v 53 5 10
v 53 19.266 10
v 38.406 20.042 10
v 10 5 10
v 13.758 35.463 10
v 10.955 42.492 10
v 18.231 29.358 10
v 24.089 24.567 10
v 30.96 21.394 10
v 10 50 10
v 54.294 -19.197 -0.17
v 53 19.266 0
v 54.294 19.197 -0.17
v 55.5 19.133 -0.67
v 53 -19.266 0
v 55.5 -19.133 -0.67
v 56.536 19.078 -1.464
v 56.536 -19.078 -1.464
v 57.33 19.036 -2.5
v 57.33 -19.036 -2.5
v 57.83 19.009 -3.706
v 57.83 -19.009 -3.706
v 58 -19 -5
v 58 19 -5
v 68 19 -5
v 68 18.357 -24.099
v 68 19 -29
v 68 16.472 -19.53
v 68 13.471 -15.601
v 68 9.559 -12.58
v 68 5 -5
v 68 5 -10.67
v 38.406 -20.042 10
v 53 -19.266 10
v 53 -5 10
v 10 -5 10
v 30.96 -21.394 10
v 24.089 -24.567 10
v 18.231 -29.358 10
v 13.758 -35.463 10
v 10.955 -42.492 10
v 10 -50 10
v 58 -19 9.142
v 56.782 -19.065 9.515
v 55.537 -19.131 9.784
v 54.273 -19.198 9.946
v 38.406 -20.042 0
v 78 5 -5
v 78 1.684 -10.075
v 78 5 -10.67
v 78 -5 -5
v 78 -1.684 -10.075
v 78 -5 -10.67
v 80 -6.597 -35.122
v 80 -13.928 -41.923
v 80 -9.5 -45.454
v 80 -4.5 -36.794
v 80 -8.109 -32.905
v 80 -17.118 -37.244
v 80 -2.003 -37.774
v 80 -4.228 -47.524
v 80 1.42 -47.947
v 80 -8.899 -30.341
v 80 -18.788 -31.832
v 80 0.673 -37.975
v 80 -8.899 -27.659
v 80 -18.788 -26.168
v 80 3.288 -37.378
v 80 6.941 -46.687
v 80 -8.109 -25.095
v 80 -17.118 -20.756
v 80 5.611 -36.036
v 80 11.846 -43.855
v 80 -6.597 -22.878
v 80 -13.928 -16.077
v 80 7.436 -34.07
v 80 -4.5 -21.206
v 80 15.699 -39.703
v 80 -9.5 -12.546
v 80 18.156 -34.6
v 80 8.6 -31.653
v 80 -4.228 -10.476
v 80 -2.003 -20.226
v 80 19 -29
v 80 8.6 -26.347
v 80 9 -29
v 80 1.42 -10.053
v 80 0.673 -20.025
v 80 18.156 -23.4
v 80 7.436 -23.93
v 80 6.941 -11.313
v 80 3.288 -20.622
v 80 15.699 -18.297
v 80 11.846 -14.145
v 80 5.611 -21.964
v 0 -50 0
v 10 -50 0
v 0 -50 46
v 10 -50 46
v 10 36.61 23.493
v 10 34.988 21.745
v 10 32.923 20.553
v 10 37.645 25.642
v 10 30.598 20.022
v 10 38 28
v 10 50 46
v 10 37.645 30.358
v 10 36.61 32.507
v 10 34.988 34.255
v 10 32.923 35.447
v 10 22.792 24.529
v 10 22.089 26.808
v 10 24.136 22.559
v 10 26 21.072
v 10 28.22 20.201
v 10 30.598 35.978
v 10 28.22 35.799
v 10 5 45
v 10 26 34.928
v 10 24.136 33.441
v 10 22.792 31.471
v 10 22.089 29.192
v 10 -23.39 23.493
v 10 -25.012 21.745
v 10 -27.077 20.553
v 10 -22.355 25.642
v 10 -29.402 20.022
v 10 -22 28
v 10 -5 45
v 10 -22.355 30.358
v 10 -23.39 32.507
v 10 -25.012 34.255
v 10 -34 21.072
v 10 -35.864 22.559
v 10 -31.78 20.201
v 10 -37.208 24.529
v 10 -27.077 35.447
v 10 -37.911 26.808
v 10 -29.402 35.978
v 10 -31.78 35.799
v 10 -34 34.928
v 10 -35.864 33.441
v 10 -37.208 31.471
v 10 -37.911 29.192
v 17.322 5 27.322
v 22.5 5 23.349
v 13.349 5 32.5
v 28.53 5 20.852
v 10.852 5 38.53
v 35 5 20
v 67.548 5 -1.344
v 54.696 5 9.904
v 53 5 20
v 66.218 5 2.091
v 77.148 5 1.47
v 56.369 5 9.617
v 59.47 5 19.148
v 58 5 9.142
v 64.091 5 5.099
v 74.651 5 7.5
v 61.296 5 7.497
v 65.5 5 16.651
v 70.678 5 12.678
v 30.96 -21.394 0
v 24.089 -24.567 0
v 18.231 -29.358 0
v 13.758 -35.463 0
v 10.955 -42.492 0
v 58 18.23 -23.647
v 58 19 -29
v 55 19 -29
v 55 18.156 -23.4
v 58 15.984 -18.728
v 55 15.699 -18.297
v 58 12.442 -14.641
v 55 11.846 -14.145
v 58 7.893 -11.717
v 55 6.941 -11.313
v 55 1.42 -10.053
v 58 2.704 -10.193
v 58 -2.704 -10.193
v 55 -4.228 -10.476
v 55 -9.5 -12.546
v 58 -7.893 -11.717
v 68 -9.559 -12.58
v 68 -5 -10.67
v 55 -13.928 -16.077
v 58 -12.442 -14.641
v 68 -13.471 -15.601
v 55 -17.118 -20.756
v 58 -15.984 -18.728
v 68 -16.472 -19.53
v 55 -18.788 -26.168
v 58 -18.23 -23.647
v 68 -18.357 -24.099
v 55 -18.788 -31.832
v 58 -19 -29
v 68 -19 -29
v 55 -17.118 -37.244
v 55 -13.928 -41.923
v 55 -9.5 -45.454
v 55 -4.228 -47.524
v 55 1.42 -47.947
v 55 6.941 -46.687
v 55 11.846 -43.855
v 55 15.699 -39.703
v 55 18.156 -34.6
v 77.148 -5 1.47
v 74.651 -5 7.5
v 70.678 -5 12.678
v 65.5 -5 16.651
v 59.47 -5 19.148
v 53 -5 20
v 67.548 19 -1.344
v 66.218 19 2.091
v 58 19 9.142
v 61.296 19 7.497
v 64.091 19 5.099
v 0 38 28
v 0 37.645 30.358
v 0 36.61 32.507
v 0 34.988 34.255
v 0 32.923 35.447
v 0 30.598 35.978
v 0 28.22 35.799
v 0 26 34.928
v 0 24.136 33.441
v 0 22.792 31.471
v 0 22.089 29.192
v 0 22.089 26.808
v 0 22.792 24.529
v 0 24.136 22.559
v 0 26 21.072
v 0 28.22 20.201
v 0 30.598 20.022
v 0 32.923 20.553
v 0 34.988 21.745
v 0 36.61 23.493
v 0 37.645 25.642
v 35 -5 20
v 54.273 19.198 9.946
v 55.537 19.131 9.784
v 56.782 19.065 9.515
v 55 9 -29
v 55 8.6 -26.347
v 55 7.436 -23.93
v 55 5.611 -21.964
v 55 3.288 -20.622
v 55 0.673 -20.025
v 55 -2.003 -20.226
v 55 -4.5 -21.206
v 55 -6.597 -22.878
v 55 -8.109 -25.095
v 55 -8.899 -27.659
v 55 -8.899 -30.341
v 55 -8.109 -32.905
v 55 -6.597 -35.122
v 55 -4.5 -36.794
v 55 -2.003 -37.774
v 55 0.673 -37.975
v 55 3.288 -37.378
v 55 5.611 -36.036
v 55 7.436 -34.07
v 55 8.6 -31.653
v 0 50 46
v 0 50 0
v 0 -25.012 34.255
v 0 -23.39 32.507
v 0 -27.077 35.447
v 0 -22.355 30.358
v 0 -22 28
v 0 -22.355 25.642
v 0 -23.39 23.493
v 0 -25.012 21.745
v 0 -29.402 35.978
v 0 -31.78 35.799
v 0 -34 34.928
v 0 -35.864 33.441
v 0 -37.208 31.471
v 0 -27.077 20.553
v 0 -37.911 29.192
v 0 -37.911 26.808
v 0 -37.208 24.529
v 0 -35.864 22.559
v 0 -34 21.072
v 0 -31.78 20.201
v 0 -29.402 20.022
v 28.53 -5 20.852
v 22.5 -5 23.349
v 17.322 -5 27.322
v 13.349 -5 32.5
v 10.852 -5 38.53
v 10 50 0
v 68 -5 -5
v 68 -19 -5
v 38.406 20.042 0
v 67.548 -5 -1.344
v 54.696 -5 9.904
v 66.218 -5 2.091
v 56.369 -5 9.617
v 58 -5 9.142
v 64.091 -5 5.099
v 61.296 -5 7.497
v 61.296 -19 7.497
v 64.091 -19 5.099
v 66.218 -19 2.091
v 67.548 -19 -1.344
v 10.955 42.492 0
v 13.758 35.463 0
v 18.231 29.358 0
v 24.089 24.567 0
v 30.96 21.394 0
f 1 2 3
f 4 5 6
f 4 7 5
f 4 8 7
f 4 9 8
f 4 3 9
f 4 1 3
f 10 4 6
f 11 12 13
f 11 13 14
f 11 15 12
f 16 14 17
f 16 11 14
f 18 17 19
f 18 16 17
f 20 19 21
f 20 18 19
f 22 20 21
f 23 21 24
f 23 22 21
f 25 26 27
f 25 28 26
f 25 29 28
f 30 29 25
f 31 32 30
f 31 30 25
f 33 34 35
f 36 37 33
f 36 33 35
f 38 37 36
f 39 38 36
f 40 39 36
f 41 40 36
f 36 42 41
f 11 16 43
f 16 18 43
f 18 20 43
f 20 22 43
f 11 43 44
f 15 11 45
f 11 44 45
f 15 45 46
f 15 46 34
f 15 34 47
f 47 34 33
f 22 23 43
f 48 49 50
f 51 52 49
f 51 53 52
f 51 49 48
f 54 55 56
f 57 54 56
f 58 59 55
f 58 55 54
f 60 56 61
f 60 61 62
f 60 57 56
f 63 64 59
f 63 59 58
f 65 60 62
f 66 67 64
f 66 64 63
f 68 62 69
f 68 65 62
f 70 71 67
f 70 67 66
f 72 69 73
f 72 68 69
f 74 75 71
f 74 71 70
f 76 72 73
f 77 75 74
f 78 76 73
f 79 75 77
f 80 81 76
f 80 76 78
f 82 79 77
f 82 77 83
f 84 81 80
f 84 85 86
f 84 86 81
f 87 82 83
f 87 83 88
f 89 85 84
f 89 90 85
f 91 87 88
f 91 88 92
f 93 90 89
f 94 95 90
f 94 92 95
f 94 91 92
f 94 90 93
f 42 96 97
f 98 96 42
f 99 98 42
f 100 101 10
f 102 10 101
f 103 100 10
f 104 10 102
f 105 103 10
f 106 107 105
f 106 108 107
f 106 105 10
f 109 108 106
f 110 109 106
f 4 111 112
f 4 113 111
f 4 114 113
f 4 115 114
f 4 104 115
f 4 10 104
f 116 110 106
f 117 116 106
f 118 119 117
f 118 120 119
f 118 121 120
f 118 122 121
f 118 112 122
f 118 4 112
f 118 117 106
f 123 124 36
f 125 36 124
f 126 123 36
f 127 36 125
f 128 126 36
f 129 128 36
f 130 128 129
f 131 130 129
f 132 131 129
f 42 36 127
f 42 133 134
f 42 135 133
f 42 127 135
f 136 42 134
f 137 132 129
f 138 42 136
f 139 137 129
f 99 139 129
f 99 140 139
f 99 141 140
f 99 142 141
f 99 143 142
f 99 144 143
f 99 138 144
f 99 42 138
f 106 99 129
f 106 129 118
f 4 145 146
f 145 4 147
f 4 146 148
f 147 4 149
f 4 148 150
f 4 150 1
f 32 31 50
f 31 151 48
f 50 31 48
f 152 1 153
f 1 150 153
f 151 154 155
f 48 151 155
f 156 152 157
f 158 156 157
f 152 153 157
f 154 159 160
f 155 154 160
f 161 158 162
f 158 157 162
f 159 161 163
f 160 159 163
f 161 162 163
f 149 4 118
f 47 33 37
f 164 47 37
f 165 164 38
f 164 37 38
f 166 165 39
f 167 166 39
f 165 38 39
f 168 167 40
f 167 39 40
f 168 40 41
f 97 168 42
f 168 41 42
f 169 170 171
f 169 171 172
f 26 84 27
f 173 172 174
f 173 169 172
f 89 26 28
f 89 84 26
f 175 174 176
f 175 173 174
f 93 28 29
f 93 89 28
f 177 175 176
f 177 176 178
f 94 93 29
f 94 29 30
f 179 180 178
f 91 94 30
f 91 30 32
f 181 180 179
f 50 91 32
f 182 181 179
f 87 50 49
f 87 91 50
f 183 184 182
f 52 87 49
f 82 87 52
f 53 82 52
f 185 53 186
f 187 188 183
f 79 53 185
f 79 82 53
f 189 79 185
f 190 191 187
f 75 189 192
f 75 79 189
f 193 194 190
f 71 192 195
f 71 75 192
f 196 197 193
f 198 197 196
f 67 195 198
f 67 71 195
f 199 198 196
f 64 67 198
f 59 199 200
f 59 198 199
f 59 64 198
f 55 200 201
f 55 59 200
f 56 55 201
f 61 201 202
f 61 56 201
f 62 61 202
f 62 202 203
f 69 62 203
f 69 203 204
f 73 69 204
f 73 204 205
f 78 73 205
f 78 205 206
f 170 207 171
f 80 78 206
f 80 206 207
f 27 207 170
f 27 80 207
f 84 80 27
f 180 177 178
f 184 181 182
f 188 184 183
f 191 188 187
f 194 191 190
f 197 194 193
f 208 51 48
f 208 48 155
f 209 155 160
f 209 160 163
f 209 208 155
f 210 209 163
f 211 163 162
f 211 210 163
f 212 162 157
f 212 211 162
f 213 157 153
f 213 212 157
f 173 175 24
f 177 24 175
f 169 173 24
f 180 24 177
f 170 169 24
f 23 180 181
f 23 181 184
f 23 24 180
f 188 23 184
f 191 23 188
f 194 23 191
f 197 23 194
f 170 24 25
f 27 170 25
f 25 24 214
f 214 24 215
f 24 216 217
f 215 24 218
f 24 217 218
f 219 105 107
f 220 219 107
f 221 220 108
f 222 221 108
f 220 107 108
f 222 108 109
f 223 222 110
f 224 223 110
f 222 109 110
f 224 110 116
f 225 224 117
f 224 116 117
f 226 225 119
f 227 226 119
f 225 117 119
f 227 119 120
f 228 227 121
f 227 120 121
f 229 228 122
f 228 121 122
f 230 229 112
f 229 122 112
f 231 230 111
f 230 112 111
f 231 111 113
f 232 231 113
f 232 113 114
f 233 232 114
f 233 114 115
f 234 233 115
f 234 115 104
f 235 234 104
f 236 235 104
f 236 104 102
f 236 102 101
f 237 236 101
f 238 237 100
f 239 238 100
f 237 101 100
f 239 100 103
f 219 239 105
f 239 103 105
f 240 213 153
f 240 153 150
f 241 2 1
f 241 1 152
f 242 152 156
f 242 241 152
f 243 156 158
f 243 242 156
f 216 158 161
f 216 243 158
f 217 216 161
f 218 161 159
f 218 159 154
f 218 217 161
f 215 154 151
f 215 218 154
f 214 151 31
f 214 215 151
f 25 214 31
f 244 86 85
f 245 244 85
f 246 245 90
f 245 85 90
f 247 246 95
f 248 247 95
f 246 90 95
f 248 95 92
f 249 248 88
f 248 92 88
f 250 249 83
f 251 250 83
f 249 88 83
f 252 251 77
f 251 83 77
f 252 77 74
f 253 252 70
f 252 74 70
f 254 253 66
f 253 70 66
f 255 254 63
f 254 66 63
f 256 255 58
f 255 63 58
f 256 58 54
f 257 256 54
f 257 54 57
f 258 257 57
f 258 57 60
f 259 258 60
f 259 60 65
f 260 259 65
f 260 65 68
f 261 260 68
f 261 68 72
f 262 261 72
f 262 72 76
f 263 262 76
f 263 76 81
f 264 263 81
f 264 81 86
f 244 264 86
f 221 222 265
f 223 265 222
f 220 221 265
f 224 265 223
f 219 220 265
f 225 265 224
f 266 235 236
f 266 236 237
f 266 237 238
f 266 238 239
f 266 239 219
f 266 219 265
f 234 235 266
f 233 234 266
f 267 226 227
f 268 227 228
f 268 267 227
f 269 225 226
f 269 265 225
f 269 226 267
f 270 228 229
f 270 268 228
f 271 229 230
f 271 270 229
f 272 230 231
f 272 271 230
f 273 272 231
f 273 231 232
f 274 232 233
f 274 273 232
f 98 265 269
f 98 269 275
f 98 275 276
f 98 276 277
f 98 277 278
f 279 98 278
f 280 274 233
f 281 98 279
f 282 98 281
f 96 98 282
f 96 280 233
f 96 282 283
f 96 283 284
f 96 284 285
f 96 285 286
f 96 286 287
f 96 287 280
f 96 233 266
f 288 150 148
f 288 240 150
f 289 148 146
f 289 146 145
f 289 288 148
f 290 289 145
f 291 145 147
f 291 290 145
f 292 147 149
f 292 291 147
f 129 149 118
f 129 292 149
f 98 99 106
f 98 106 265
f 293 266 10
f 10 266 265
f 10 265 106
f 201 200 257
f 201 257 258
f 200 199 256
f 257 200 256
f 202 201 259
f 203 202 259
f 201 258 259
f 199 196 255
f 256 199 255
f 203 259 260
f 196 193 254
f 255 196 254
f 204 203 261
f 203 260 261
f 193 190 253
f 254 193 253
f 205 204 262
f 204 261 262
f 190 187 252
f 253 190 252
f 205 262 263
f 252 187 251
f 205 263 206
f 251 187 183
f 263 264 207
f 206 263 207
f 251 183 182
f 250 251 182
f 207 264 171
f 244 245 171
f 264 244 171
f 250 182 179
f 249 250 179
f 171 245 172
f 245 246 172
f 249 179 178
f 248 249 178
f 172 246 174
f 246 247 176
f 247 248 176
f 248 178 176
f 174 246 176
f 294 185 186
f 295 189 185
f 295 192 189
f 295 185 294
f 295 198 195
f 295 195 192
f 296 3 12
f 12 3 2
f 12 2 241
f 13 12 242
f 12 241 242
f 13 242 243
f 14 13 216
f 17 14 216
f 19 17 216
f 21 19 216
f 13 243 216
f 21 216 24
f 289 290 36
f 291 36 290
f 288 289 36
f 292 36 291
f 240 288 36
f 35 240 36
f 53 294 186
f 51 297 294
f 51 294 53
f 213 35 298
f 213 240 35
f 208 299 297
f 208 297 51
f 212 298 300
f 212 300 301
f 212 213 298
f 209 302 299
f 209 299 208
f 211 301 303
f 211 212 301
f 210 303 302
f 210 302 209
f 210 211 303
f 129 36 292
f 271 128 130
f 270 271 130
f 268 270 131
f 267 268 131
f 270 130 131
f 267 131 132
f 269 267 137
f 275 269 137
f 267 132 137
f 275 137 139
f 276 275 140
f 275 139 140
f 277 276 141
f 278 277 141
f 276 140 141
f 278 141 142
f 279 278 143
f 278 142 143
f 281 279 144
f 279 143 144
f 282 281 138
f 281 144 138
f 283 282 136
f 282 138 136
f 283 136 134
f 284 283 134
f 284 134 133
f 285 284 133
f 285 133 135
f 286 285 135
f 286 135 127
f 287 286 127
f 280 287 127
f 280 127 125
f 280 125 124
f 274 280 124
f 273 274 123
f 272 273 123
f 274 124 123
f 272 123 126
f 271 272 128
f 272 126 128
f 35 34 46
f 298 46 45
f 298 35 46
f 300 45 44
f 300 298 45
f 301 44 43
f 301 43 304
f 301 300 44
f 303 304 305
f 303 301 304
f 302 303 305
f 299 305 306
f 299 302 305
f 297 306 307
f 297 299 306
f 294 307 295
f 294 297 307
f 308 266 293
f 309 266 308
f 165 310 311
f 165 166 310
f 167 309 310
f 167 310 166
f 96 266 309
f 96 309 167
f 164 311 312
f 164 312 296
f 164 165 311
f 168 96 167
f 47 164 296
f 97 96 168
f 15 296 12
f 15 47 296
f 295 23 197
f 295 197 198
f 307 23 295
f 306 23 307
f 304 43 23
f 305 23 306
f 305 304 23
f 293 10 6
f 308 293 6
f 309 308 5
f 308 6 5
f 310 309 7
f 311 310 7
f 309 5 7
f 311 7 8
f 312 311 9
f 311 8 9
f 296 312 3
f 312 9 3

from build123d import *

# Parameters (mm, degrees)
F1_DEPTH    = 50
F2_DEPTH    = 19
F4_DEPTH    = 10
F5_R        = 5
F6_T1_DEPTH = 113
F7_R        = 8
F8_DEPTH    = 10
F11_W       = 28.4062897359
F11_H       = 10.0000000002
F12_DEPTH   = 5
F10_R       = 9
F13_DEPTH   = 25
F14_DEPTH   = 20


# Not quite as in the source:
# - a fillet or chamfer that OpenCascade refuses, or shapes differently, is made with other operations: its cross-section is extruded or revolved along the edge and cut away or added


with BuildPart() as f1:
    # F0 (on Front) → F1 (new body, symmetric)
    with BuildSketch(Plane.XZ):
        Polygon((0, 46), (0, 0), (58, 0), (58, 10), (10, 10), (10, 46), align=None)
    extrude(amount=F1_DEPTH, both=True)

    # F0 (on Front) → F2 (join, symmetric)
    with BuildSketch(Plane.XZ):
        Polygon((0, 46), (0, 0), (58, 0), (58, 10), (10, 10), (10, 46), align=None)
        Polygon((58, 10), (58, 0), (58, -29), (68, -29), (68, 10), align=None)
    extrude(amount=F2_DEPTH, both=True)

    # F3 (on face) → F4 (cut, through all)
    with BuildSketch(Plane.XY.offset(10)):
        with BuildLine():
            Line((58, -19), (38.4062897359, -20.0423617821))
            ThreePointArc((38.4062897359, -20.0423617821), (18.2306257793, -29.3579471457), (10, -50))
            Line((10, -50), (58, -50))
            Line((58, -50), (58, -19))
        make_face()
        with BuildLine():
            Line((58, 50), (10, 50))
            ThreePointArc((10, 50), (18.2306257793, 29.3579471457), (38.4062897359, 20.0423617821))
            Line((38.4062897359, 20.0423617821), (58, 19))
            Line((58, 19), (58, 50))
        make_face()
    extrude(amount=-F4_DEPTH, mode=Mode.SUBTRACT)

    # F5
    f5_edges = [f1.edges().sort_by_distance(p)[0] for p in [
        (58, 0, 0),
    ]]
    fillet(f5_edges, radius=F5_R)

    # F6: fillet of radius 15 on 1 edges, made by hand

    # F6_s2 → F6_t1 (cut)
    with BuildSketch(Plane.XZ.offset(-56.5)):
        with BuildLine():
            ThreePointArc((53, 10), (63.6066017178, 5.6066017178), (68, -5))
            Line((68, -5), (68, 10))
            Line((68, 10), (53, 10))
        make_face()
    extrude(amount=F6_T1_DEPTH, mode=Mode.SUBTRACT)

    # F7 (on face) → F8 (cut, through all)
    with BuildSketch(Plane.YZ.offset(10)):
        with Locations((-30, 28)):
            Circle(F7_R)
        with Locations((30, 28)):
            Circle(F7_R)
    extrude(amount=-F8_DEPTH, mode=Mode.SUBTRACT)

    # F11 (on Front) → F12 (join, symmetric)
    with BuildSketch(Plane.XZ):
        Polygon((10, 10), (10, 45.0000000683), (10, 46), (0, 46), (0, 0), (10, 0), align=None)
        with BuildLine():
            ThreePointArc((35, 20), (17.3223304462, 27.3223304945), (10, 45.0000000683))
            Line((10, 45.0000000683), (10, 10))
            Line((10, 10), (38.4062897359, 10))
            Line((38.4062897359, 10), (53, 10))
            ThreePointArc((53, 10), (55.5365296809, 9.7839783948), (58, 9.1421356237))
            ThreePointArc((58, 9.1421356237), (65.2474487139, 3.6602540378), (68, -5))
            Line((68, -5), (68, -29))
            Line((68, -29), (78, -29))
            Line((78, -29), (78, -5))
            ThreePointArc((78, -5), (70.6776695297, 12.6776695297), (53, 20))
            Line((53, 20), (35, 20))
        make_face()
        with Locations((24.2031448679, 4.9999999999)):
            Rectangle(F11_W, F11_H)
    extrude(amount=F12_DEPTH, both=True)

    # F10 (on offset) → F13 (join)
    with BuildSketch(Plane.YZ.offset(80)):
        with BuildLine():
            ThreePointArc((-19, -29), (0, -48), (19, -29))
            ThreePointArc((19, -29), (0, -10), (-19, -29))
        make_face()
        with Locations((0, -29)):
            Circle(F10_R, mode=Mode.SUBTRACT)
    extrude(amount=-F13_DEPTH)

    # F14 (cut, through all): faces of the model
    f14_faces = [f1.faces().sort_by_distance(p)[0] for p in [
        (78, 0, -24.7319215604),
        (68, -6.6350234662, -26.0867467093),
        (68, 6.6350234662, -26.0867467093),
    ]]
    extrude(f14_faces, amount=-F14_DEPTH, mode=Mode.SUBTRACT)


solid = f1.part
